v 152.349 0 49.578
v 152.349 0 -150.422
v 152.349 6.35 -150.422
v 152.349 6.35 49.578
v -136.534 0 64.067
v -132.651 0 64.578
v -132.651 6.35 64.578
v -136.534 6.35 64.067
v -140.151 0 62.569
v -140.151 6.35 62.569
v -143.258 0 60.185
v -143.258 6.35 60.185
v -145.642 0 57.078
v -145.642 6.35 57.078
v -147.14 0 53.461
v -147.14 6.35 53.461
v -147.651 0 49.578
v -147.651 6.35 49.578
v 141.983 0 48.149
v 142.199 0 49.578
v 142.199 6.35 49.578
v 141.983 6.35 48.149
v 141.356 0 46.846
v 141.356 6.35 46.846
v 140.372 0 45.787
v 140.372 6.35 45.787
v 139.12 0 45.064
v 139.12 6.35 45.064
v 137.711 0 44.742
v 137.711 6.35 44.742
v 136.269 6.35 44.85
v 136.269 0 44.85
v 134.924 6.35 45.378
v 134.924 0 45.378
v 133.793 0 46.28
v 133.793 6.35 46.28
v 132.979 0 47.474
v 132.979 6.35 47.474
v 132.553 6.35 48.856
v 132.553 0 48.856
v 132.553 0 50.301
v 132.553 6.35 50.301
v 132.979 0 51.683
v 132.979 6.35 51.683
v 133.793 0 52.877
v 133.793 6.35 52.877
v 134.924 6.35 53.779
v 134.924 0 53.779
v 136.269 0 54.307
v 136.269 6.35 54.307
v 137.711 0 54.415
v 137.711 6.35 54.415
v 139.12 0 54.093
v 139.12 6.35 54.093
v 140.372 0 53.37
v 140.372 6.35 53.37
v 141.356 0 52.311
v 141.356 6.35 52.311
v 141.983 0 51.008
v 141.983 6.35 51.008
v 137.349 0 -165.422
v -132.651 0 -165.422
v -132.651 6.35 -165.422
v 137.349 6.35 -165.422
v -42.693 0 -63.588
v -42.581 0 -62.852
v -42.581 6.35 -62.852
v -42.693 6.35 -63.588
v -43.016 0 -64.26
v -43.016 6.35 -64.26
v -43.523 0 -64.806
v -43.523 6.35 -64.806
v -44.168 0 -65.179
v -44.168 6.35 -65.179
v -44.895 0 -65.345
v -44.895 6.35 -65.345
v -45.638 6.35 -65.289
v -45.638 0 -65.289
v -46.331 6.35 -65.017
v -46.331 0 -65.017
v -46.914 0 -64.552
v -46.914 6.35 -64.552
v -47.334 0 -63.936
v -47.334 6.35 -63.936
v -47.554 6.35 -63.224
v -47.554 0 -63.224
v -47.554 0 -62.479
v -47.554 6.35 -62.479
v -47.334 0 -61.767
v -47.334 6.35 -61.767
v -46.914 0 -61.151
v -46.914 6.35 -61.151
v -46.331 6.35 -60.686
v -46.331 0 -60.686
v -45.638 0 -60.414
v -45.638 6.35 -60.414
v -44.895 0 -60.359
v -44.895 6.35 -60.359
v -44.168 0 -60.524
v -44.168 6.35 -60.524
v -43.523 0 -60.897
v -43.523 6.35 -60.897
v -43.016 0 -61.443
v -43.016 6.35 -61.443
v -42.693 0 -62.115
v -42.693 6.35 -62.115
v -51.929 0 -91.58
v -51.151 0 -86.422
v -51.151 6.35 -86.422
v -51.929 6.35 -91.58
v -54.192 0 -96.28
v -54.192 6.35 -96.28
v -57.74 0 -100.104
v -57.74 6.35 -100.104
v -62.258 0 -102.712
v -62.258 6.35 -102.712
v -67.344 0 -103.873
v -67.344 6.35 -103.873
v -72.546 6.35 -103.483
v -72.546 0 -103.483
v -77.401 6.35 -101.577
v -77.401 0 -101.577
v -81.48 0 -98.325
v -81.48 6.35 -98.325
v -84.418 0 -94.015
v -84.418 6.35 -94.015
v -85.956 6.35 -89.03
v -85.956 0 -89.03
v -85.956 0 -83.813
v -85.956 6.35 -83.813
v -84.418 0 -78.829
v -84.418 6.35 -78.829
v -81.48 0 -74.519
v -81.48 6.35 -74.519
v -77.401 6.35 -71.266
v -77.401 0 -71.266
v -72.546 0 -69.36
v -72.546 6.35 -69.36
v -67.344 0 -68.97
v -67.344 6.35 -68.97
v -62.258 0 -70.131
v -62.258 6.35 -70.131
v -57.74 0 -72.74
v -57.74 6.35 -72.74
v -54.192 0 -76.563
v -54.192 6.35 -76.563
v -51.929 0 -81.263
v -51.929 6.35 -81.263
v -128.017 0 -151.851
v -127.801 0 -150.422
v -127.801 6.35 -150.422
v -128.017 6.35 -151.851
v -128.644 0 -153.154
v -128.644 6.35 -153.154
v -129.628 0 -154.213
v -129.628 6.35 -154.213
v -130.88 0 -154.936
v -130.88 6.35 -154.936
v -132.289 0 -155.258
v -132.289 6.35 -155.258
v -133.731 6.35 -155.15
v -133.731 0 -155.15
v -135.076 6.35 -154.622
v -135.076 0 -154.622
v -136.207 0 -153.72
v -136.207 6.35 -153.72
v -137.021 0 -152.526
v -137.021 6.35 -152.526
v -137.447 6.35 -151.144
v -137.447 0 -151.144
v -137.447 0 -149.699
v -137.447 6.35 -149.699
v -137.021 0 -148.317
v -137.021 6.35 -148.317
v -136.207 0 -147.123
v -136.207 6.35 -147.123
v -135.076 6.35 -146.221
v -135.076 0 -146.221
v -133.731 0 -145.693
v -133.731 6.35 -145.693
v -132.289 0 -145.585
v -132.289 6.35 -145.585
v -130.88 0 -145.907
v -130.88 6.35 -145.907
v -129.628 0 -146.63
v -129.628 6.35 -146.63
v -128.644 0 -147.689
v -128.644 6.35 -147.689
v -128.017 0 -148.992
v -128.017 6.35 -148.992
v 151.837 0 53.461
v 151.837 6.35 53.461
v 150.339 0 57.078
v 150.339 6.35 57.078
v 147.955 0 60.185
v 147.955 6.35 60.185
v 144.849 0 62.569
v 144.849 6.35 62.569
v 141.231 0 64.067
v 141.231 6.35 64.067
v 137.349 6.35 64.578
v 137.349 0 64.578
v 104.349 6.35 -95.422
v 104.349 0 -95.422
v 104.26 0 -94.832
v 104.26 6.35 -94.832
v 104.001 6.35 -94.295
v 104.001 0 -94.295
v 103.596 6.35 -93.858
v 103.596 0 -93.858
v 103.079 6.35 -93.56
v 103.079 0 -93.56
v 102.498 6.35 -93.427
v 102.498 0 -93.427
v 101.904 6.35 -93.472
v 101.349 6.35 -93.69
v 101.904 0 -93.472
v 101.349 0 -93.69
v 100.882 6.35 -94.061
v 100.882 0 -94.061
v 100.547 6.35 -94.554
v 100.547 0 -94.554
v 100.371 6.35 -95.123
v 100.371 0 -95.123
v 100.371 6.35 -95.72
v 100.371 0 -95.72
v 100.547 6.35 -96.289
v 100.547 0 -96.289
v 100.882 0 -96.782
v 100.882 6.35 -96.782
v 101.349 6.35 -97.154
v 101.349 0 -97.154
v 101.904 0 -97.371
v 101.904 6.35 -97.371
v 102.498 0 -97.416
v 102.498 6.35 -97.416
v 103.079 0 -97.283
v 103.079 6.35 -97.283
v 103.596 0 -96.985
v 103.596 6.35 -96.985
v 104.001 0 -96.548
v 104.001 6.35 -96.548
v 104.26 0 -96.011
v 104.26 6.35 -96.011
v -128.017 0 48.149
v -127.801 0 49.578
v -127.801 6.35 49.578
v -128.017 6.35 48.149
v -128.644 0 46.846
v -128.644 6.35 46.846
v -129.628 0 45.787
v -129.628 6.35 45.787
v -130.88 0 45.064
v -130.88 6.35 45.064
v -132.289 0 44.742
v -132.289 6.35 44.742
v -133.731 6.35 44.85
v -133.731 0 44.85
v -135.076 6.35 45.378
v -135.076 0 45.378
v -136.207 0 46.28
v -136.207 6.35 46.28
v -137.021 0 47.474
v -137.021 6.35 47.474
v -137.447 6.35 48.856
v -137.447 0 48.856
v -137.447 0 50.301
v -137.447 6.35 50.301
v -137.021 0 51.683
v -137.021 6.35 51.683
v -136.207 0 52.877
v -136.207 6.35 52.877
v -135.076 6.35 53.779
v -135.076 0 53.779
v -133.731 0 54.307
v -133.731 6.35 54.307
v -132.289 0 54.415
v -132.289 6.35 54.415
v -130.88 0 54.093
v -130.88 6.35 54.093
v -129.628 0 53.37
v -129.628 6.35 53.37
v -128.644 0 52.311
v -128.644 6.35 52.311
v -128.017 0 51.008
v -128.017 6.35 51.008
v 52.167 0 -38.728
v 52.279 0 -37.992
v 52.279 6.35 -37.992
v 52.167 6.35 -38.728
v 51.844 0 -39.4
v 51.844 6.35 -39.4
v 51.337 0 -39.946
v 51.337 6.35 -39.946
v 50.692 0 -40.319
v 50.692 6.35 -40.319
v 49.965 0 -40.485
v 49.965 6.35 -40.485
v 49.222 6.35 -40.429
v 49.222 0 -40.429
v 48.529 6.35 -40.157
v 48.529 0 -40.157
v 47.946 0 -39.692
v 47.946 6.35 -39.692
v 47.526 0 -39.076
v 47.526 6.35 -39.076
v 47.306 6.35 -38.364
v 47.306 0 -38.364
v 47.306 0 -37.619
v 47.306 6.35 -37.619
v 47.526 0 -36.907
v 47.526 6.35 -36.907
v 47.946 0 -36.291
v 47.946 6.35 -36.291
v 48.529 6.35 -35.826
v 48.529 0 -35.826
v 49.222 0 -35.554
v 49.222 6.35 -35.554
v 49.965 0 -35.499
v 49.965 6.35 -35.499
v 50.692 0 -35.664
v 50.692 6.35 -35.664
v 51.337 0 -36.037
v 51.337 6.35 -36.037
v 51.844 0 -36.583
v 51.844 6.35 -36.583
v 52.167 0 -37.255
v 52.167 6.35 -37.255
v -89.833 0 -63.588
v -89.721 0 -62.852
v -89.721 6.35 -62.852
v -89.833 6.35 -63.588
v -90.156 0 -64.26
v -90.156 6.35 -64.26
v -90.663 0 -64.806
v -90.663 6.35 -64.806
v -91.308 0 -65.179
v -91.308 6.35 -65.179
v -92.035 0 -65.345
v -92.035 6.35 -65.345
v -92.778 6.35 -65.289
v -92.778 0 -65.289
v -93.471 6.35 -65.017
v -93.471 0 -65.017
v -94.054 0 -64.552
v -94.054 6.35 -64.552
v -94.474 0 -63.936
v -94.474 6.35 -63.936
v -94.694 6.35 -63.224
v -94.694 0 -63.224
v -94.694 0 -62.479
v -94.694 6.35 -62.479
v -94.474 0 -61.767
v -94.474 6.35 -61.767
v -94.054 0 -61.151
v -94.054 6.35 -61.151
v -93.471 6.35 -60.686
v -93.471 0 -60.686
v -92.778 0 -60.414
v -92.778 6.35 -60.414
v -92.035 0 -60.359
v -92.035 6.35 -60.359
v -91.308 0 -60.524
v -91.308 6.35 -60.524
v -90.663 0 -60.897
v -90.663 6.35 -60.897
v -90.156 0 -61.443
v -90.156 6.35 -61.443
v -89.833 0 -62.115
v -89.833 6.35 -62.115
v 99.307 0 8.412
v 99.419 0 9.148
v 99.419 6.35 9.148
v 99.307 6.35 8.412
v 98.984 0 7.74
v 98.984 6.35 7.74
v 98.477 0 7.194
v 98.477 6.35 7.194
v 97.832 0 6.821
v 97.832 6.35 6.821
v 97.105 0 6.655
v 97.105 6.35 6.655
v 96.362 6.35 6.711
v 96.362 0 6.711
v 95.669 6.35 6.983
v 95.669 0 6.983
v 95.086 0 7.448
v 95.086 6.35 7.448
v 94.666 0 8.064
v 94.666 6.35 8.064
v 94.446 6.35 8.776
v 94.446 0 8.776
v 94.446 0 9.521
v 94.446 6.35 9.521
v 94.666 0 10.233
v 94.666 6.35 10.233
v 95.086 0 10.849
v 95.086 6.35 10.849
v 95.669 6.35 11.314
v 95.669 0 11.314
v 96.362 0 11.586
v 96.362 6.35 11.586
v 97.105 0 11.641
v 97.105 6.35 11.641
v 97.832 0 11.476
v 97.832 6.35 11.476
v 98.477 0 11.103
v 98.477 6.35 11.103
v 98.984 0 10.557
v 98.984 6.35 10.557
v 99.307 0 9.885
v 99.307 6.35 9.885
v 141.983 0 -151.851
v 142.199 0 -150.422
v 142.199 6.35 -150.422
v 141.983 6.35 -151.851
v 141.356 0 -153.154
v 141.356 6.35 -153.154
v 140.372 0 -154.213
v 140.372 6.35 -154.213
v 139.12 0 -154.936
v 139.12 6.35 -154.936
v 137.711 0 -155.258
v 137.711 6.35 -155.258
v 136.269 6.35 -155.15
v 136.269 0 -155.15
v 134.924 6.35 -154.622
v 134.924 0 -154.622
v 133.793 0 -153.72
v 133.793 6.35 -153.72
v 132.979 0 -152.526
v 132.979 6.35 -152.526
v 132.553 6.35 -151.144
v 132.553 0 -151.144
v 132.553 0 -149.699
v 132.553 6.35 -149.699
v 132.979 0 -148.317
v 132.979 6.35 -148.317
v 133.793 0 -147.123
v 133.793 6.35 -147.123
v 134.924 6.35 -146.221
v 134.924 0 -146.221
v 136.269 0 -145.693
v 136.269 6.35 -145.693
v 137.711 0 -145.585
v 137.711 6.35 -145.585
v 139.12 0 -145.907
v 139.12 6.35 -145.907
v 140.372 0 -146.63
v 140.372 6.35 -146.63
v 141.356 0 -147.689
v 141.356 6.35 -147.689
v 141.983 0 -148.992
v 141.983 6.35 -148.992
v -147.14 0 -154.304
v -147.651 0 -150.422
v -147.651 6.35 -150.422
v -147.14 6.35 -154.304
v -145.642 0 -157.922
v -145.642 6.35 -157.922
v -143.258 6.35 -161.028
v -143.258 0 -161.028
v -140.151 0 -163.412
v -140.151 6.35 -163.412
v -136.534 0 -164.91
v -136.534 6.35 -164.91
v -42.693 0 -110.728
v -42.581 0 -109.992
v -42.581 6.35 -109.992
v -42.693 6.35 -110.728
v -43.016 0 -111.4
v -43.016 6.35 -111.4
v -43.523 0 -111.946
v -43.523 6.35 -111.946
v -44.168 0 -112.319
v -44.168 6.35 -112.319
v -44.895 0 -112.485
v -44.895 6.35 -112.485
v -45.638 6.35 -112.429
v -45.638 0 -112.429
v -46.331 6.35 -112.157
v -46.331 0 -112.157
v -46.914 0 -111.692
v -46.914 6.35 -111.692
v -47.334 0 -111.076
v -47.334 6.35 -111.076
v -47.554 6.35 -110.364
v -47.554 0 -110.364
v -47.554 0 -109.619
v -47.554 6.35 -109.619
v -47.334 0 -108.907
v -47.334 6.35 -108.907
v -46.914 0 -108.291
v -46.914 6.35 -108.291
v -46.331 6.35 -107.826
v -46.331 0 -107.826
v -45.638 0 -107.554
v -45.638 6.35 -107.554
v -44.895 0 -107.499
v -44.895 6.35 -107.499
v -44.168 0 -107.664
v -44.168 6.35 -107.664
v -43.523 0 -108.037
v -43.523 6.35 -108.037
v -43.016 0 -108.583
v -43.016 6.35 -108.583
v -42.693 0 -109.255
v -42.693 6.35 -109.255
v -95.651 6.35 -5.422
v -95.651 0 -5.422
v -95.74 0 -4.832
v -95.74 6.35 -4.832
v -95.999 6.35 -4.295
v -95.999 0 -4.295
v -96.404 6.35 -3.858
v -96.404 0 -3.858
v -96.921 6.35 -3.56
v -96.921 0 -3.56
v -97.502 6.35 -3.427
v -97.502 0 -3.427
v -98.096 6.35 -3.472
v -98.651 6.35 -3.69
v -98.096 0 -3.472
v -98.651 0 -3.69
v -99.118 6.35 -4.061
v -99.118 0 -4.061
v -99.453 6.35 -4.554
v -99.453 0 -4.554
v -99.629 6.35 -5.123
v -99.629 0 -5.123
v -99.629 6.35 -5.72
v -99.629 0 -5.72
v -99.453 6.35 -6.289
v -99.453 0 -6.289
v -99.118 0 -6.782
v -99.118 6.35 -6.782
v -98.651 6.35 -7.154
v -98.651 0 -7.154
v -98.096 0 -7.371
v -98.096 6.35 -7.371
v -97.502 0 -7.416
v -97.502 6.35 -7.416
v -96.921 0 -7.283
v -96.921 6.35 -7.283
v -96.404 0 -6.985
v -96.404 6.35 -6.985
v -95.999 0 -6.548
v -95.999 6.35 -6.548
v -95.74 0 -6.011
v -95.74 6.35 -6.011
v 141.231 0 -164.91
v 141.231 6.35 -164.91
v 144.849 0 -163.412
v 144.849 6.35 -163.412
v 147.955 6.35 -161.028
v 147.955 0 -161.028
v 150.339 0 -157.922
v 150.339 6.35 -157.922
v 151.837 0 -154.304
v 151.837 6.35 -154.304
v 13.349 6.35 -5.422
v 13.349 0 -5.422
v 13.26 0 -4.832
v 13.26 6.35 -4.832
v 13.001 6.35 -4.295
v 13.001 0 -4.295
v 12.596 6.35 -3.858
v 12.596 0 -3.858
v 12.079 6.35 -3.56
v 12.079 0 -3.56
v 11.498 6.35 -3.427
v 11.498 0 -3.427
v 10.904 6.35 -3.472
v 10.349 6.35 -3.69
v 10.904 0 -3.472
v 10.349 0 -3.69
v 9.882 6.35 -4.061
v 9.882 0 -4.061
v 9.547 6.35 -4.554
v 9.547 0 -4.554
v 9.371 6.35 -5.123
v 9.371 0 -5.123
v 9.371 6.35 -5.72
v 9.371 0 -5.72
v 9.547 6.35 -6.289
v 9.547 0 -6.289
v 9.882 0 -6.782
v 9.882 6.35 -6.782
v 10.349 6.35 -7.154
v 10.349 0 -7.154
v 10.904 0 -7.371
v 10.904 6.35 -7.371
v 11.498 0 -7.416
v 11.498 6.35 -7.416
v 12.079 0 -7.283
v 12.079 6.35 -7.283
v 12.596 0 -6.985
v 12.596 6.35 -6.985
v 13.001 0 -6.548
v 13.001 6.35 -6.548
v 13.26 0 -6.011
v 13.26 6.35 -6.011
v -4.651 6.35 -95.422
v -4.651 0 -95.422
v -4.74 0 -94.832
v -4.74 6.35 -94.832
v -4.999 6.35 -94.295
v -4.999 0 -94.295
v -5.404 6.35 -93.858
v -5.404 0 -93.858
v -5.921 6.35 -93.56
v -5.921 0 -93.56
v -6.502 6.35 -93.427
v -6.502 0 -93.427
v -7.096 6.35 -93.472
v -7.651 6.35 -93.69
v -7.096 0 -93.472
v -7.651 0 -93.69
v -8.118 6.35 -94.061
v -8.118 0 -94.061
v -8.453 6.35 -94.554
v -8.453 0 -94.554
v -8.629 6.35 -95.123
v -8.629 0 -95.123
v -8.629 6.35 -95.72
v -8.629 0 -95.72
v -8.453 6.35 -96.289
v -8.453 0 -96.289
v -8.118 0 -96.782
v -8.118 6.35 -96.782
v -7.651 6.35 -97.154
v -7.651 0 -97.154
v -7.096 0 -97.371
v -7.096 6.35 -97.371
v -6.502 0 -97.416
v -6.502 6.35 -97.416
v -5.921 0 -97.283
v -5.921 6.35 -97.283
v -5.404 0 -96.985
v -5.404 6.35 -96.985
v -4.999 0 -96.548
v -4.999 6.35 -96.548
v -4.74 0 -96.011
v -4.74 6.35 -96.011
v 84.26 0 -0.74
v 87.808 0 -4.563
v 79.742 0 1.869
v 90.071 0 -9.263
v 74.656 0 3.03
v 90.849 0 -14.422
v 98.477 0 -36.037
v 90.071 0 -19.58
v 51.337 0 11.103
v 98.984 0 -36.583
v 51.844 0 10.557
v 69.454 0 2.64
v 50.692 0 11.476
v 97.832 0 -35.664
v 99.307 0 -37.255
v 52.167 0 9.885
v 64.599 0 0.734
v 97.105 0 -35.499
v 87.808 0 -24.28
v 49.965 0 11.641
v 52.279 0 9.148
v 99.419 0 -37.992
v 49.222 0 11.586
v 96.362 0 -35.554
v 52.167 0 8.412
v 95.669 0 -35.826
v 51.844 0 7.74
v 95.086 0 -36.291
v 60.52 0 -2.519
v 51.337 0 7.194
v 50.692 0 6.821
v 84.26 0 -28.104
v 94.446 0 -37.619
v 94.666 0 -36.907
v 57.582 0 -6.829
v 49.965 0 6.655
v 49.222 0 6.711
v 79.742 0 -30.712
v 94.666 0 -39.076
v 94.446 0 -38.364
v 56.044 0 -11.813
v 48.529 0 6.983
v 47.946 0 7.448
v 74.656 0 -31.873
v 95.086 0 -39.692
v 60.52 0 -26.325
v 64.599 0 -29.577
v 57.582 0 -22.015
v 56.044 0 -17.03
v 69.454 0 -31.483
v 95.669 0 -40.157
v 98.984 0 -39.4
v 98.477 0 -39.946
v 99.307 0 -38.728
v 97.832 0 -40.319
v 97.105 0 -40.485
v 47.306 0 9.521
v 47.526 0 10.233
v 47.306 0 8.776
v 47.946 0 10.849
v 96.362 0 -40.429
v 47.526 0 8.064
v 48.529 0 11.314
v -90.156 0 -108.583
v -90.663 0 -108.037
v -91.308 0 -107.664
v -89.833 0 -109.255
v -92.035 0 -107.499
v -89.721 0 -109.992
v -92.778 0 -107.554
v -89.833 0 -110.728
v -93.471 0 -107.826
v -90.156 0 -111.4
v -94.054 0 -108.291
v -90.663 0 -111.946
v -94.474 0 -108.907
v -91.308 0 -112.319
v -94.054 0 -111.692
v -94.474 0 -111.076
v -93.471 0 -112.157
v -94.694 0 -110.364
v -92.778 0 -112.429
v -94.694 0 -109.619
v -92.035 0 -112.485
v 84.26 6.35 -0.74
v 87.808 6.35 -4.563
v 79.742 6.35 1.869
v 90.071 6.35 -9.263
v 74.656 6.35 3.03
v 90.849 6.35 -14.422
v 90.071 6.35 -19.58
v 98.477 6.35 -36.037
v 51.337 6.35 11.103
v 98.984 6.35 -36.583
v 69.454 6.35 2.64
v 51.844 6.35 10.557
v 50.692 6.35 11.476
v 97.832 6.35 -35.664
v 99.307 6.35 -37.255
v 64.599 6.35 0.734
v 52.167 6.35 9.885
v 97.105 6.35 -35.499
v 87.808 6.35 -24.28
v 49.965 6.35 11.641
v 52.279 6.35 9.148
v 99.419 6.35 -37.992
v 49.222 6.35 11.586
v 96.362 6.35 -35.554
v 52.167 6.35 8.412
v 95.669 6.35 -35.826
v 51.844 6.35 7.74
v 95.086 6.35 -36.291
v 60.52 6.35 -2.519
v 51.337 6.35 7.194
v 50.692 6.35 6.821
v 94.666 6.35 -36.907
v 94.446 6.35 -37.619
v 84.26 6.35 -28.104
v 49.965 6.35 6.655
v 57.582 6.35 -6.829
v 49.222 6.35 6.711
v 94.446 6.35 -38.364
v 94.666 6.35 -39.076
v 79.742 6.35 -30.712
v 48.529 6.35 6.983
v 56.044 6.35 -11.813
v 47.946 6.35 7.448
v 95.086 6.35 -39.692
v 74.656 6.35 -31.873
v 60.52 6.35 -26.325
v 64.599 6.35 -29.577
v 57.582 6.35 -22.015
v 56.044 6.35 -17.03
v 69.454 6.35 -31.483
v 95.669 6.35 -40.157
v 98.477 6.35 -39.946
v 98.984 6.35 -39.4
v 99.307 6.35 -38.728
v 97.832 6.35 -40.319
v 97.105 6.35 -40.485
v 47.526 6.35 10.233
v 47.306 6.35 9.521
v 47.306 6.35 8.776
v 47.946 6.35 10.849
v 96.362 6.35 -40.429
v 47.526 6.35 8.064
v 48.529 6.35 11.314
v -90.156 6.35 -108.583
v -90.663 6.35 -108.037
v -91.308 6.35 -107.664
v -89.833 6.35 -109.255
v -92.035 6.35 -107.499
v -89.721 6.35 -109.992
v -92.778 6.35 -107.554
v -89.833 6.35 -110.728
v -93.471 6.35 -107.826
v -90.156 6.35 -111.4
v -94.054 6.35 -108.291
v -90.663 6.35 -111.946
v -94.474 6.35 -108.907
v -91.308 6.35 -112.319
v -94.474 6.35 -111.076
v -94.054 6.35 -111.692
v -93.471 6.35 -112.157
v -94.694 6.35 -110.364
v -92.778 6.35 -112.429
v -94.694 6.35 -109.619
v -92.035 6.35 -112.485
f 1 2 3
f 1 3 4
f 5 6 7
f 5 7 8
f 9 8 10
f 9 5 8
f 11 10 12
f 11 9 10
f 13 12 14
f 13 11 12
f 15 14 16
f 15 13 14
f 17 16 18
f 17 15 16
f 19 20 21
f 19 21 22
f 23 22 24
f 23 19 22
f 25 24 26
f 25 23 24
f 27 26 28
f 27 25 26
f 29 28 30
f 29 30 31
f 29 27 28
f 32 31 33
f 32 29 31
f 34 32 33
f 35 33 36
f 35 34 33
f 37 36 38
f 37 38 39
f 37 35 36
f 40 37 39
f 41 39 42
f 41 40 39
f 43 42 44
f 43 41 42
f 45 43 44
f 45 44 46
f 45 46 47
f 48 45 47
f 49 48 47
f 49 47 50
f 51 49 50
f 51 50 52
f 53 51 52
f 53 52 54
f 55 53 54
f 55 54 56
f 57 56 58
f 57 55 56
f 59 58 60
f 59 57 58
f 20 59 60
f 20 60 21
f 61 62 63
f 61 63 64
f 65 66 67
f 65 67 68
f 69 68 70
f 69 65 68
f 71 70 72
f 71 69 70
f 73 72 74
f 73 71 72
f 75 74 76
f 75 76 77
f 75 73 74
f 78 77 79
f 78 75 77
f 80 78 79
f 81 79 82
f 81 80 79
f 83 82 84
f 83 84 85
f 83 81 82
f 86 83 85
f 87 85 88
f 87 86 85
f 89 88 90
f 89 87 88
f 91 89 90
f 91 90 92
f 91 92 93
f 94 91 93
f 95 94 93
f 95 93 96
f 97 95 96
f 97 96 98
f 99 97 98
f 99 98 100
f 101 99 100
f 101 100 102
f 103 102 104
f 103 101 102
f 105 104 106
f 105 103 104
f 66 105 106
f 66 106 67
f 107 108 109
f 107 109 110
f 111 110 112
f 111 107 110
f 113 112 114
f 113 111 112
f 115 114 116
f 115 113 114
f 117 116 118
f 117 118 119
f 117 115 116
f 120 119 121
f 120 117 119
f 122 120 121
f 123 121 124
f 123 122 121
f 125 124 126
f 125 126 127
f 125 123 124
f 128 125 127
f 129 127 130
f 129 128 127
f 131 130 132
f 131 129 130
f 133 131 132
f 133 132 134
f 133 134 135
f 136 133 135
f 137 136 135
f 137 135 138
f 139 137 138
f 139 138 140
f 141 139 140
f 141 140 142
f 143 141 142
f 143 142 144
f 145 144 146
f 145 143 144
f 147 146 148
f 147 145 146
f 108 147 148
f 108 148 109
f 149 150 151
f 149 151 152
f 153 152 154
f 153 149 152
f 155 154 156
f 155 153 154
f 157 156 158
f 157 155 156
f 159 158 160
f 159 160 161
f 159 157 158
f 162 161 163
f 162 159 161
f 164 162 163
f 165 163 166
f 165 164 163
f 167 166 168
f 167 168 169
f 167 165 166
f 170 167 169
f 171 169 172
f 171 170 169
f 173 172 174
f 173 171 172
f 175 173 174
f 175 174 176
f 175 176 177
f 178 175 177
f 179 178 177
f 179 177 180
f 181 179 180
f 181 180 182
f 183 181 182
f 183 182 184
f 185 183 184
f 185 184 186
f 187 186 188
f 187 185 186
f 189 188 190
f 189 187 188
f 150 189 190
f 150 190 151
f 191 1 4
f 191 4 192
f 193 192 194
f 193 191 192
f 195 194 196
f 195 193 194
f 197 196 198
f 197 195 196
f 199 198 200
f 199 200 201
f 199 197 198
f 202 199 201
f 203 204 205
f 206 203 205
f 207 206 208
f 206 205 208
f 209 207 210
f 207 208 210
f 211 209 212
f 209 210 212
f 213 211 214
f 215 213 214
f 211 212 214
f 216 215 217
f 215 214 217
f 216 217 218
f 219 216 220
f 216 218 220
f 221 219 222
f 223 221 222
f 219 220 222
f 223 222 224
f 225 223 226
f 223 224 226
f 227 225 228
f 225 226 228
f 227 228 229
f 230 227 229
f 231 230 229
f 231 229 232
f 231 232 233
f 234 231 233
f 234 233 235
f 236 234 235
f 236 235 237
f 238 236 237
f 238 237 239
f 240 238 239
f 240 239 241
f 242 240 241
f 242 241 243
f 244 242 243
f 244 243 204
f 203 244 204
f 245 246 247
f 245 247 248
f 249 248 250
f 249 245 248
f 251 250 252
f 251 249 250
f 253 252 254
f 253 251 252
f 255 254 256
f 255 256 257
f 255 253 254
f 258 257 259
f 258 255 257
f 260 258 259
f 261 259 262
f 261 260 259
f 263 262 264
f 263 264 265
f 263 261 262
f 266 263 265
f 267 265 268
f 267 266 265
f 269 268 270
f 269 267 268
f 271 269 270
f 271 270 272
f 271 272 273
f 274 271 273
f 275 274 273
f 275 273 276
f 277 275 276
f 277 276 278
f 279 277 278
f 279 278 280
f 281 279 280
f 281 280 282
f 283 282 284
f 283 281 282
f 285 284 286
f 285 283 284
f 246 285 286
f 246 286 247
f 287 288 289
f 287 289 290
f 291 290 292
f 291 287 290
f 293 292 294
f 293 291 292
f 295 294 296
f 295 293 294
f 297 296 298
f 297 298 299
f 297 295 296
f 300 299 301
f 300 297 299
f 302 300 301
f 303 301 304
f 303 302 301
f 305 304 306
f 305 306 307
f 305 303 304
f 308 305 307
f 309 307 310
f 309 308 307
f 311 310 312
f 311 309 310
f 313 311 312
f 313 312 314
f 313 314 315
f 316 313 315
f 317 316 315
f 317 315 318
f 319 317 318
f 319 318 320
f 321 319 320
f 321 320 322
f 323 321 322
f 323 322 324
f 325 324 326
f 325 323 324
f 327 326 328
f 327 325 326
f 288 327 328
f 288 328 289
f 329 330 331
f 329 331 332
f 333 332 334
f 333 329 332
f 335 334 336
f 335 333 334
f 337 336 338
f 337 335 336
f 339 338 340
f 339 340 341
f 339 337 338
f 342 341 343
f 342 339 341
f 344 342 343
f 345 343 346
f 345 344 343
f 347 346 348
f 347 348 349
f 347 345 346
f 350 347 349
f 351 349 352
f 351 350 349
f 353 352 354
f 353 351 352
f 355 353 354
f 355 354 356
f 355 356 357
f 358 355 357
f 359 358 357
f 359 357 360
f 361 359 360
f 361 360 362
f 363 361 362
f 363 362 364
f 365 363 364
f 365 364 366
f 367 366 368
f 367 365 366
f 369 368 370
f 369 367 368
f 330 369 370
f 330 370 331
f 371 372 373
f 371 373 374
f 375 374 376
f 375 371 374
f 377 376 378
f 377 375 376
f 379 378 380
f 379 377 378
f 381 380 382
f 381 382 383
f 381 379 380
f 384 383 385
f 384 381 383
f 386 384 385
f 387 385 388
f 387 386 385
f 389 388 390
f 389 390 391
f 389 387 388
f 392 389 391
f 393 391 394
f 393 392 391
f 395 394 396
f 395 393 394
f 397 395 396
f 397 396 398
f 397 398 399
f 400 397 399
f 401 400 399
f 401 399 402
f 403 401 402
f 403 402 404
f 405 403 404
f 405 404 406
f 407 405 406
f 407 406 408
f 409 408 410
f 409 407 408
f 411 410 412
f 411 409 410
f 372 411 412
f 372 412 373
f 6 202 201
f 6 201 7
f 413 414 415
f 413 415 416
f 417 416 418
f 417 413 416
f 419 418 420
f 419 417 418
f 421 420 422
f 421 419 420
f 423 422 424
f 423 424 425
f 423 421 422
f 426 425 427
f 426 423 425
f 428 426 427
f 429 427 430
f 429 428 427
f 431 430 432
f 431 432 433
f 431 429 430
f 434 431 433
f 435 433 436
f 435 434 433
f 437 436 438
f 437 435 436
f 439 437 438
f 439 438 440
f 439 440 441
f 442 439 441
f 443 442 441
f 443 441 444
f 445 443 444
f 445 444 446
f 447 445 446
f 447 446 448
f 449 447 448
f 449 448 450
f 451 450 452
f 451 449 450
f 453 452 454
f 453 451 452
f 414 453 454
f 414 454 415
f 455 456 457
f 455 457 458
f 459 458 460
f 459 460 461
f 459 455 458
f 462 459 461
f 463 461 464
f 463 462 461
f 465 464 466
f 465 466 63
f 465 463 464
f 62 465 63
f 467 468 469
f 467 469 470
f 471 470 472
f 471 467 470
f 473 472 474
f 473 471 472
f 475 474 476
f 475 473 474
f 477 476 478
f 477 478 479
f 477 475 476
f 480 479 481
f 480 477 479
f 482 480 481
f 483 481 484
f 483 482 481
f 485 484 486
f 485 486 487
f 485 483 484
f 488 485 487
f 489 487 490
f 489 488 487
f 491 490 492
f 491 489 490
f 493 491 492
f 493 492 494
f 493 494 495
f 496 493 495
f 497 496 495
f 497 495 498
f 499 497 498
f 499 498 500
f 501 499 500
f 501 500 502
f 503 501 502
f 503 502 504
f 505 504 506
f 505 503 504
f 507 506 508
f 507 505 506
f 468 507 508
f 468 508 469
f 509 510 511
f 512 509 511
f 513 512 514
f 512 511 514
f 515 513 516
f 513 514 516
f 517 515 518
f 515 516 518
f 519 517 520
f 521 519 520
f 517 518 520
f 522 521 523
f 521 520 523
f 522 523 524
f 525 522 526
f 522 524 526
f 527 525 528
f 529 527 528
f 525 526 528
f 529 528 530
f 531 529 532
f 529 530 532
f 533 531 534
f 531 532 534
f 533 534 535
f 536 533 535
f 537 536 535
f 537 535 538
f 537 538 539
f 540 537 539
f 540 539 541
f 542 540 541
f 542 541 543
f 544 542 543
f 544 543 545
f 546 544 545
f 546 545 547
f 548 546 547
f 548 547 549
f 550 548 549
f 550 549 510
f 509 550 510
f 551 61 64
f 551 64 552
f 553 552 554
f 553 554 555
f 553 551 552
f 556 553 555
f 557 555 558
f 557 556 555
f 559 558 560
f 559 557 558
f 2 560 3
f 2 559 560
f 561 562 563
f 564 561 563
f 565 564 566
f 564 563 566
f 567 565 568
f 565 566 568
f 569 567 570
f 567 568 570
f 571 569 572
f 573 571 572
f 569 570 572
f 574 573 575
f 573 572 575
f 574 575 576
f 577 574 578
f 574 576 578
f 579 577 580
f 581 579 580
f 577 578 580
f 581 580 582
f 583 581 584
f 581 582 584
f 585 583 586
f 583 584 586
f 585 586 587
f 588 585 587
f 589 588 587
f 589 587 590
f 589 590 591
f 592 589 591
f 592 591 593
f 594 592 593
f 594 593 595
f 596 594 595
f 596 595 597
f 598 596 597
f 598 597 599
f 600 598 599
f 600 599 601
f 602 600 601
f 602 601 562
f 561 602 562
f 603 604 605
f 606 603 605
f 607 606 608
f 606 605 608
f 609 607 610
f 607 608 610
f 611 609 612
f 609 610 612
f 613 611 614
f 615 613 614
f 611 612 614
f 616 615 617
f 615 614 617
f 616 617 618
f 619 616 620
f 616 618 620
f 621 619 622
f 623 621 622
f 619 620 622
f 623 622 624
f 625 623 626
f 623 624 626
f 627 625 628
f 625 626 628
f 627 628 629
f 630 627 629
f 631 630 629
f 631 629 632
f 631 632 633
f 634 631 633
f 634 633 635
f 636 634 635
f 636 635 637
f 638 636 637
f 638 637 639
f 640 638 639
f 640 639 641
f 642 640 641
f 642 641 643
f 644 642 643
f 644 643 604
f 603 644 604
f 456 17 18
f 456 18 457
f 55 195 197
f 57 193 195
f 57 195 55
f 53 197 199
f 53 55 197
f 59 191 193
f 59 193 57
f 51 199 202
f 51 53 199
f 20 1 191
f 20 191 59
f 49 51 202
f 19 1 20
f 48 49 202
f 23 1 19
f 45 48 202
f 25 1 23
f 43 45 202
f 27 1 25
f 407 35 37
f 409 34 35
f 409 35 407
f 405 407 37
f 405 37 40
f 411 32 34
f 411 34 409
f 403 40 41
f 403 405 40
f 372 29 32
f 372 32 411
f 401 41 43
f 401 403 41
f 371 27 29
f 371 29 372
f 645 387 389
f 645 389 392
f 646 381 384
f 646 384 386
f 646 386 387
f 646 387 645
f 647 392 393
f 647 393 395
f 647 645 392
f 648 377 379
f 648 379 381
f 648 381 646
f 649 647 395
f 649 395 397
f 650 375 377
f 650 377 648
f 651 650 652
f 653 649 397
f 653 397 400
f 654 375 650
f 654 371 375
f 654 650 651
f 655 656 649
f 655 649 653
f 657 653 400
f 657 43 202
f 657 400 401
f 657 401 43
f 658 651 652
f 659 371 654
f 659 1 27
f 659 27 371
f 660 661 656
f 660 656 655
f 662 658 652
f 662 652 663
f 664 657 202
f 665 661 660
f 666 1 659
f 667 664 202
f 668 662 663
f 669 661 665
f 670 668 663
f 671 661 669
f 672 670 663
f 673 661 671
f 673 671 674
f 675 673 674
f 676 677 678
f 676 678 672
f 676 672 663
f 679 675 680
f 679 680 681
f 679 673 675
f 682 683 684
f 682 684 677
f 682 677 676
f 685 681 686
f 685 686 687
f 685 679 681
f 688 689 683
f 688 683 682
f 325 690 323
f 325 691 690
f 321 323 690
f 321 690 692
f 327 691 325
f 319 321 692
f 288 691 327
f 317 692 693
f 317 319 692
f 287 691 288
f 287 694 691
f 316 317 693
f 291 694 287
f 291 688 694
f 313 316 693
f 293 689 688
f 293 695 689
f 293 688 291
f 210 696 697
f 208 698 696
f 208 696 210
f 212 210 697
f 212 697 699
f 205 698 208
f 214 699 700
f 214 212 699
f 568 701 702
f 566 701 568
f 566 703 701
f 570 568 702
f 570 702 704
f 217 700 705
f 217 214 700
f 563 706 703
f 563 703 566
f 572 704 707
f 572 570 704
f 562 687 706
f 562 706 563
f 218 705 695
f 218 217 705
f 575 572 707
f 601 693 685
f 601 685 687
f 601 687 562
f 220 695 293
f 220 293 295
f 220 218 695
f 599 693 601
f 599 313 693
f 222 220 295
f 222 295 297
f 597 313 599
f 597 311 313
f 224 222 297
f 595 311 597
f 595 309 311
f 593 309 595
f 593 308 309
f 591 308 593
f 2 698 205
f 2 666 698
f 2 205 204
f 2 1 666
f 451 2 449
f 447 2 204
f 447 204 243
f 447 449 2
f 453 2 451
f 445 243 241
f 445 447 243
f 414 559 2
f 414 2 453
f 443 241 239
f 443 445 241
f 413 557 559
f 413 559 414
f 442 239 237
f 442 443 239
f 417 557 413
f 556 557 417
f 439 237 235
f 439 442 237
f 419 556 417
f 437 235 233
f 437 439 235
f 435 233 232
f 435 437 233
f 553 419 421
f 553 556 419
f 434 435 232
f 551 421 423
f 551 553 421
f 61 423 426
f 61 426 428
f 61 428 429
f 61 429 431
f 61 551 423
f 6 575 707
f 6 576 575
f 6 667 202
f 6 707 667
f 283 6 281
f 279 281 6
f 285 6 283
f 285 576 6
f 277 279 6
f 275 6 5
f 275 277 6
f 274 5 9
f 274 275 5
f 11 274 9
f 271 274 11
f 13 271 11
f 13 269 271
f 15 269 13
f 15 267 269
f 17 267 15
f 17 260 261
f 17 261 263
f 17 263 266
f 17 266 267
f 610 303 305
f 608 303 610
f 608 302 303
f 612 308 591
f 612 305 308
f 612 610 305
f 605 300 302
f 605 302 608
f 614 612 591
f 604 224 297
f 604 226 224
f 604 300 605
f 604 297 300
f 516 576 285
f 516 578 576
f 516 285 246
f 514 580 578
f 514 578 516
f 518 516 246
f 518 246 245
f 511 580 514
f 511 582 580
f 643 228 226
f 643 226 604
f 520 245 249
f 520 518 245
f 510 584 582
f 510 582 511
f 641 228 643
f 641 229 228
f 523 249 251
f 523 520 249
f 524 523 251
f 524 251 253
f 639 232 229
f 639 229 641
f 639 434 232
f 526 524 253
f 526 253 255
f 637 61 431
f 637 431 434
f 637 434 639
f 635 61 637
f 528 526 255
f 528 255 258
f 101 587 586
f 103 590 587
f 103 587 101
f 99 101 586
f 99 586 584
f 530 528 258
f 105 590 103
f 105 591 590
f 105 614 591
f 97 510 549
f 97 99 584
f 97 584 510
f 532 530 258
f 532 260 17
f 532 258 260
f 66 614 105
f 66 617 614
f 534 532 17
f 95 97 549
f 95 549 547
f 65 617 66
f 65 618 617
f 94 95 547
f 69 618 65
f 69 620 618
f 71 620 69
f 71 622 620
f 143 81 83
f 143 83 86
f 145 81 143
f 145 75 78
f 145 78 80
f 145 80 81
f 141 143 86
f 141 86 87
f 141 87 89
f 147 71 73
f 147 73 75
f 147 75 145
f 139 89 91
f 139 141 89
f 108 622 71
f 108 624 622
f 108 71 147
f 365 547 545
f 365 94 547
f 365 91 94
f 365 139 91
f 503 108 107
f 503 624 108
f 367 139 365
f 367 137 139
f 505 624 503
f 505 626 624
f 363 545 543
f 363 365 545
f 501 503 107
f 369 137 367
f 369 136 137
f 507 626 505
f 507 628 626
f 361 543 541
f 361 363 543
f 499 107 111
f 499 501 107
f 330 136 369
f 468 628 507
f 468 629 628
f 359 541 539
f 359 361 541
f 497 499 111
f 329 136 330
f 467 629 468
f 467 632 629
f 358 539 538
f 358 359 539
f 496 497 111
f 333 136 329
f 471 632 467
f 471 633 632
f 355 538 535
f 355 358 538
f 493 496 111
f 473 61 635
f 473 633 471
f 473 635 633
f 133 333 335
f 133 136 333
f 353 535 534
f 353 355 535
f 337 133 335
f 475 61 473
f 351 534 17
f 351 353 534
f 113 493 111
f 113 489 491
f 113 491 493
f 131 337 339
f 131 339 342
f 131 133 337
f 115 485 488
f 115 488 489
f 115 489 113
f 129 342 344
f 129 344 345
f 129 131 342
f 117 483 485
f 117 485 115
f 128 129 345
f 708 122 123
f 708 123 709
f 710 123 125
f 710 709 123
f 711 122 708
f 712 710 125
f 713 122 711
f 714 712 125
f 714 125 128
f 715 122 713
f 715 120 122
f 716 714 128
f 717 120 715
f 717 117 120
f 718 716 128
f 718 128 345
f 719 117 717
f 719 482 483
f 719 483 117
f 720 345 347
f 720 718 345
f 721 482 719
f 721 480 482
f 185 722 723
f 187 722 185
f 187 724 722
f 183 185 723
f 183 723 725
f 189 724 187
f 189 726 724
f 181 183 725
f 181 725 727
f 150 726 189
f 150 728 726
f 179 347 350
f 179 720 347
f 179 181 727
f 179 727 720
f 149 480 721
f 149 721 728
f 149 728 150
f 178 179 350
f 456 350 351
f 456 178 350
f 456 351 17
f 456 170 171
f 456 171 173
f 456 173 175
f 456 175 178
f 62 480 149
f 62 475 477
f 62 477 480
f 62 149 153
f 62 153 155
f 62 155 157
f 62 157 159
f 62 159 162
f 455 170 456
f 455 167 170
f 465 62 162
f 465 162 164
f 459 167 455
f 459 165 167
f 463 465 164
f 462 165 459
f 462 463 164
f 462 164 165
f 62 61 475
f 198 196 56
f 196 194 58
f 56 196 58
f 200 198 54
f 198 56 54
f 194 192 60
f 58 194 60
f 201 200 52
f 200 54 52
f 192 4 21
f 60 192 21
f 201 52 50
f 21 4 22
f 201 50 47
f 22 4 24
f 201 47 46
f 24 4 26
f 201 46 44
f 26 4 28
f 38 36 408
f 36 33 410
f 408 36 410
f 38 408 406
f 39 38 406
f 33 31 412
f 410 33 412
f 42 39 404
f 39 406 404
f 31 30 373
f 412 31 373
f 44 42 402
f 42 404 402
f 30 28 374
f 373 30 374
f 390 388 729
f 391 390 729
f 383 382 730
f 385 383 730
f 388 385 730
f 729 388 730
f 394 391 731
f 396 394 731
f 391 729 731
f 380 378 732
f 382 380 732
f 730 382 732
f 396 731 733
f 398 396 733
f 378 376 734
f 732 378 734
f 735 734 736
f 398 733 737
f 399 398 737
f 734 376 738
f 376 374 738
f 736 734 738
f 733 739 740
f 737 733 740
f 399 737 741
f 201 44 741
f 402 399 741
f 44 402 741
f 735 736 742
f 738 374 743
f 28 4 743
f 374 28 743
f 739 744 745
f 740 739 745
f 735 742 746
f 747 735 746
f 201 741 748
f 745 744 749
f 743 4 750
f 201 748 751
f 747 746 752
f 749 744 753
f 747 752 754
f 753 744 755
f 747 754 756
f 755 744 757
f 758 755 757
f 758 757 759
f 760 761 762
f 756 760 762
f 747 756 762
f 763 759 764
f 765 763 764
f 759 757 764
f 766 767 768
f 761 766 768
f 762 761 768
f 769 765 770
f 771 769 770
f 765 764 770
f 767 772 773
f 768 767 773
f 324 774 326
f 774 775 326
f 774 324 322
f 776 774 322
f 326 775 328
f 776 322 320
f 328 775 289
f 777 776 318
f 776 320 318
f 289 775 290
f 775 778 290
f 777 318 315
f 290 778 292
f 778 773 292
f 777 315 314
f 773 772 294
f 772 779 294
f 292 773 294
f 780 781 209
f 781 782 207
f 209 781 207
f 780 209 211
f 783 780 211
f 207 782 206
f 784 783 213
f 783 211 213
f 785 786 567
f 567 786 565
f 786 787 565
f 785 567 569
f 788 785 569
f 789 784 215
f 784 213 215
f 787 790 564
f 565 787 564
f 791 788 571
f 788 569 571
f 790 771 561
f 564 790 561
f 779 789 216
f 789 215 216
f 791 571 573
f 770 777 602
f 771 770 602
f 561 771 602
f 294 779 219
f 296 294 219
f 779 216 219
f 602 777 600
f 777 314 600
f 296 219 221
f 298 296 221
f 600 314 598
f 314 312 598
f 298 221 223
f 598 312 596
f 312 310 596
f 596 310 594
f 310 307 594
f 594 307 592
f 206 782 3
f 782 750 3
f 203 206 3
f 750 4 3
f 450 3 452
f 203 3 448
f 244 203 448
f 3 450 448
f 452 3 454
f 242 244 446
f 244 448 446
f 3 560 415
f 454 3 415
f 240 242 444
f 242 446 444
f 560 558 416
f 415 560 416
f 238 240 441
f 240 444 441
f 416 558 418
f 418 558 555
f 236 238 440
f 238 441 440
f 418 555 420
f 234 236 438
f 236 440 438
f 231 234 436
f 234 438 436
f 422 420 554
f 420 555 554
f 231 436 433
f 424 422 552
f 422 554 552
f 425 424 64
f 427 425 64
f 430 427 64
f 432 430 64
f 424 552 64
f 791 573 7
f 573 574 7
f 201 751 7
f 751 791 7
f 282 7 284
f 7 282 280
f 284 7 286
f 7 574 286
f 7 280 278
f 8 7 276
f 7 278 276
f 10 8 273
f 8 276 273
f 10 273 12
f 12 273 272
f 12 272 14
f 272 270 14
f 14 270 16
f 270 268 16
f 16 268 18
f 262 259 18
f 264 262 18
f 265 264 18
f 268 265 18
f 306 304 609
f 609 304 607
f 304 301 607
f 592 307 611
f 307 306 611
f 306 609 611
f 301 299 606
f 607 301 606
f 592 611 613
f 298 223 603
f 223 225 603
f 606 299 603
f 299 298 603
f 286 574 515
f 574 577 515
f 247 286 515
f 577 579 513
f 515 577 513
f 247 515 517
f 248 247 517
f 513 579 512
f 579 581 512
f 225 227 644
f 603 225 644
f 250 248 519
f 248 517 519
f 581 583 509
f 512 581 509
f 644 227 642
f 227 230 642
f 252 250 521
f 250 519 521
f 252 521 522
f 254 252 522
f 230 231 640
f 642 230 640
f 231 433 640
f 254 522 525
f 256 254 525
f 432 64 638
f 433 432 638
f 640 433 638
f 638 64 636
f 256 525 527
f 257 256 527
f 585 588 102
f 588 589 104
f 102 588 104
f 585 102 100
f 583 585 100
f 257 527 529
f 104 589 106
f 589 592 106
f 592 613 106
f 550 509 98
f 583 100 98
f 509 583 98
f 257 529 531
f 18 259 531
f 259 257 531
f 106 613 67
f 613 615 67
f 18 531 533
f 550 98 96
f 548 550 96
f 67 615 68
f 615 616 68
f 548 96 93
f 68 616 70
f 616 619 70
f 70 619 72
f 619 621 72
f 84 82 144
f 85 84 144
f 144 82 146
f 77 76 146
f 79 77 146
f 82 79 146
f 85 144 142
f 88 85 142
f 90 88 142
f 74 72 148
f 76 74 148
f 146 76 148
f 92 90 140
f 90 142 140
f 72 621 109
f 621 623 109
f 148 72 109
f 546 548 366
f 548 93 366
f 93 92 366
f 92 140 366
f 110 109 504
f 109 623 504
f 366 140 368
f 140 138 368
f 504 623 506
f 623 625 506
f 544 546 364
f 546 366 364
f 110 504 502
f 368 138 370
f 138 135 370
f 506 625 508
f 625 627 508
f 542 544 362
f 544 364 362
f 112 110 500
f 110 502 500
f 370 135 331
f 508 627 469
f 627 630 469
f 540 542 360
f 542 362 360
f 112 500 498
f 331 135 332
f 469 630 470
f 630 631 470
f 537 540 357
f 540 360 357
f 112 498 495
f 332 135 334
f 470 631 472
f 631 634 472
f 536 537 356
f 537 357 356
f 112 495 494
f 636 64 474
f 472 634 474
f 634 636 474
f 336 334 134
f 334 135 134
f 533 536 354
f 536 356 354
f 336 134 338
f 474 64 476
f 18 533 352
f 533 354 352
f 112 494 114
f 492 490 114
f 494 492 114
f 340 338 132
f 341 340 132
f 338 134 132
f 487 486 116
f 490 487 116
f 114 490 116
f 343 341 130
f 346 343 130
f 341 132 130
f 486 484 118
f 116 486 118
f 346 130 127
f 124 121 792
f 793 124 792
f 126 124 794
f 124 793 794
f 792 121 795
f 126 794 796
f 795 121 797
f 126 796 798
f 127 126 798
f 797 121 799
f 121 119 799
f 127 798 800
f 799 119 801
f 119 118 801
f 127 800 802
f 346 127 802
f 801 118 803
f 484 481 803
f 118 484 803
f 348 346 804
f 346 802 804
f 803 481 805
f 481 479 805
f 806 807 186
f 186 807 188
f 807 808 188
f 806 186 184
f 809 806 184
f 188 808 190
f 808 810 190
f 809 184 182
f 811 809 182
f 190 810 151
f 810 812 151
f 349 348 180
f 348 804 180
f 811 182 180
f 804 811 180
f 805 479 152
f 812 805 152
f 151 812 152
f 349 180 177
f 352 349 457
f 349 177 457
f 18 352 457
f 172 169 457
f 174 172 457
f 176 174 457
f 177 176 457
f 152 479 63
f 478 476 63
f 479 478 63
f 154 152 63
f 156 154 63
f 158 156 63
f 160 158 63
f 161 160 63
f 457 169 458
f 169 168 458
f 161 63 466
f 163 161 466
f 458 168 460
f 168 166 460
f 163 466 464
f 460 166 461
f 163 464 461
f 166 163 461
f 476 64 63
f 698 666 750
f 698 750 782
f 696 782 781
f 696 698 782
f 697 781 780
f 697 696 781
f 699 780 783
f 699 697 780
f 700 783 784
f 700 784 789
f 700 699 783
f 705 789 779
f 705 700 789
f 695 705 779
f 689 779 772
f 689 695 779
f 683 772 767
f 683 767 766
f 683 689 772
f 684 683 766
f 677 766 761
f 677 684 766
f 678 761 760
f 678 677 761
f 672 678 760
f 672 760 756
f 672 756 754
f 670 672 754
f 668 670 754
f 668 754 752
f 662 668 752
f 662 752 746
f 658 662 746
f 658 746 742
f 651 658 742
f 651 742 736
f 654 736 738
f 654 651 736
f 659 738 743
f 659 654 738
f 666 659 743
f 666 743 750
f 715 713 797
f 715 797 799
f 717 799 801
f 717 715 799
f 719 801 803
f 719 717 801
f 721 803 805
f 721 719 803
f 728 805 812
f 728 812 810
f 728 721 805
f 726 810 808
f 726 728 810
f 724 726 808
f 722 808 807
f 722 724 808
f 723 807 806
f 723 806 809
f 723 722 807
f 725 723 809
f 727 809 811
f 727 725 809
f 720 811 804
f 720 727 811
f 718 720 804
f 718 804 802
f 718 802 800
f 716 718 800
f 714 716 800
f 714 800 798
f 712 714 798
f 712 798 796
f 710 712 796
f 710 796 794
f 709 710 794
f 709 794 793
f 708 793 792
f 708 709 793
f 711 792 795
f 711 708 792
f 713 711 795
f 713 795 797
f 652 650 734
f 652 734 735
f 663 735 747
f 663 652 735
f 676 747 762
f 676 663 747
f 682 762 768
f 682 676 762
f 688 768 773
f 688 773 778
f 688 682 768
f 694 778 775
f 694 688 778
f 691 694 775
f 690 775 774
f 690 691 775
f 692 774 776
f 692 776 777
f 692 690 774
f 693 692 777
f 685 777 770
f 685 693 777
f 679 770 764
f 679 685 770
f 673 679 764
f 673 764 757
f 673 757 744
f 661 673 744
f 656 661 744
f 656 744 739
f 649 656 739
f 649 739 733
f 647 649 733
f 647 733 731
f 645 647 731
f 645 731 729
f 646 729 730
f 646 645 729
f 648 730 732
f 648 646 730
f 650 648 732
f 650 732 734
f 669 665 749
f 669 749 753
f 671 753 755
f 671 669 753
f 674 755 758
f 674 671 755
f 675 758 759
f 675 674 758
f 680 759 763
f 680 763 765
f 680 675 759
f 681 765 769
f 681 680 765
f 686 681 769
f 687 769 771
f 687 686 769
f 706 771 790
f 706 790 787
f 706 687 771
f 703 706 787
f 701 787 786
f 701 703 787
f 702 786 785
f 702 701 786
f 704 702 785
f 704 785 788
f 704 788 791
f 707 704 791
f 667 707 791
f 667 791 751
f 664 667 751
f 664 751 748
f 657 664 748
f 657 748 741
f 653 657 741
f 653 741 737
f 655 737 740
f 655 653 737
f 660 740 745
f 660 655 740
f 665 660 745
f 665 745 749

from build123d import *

# Parameters (mm, degrees)
SKETCH1_R           = 4.85
SKETCH1_R_2         = 2.5
SKETCH1_R_3         = 17.5
BOSS_EXTRUDE1_DEPTH = 6.35
SKETCH5_R           = 2
CUT_EXTRUDE2_DEPTH  = 10


with BuildPart() as part:
    # Sketch1 → Boss-Extrude1 (new body)
    with BuildSketch(Plane(origin=(0, 0, 0), x_dir=(1, 0, 0), z_dir=(0, 1, 0))):
        with BuildLine():
            Line((-132.651439051, 165.421561199), (137.348560949, 165.421561199))
            ThreePointArc((137.348560949, 165.421561199), (147.955162667, 161.028162917), (152.348560949, 150.421561199))
            Line((152.348560949, 150.421561199), (152.348560949, -49.578438801))
            ThreePointArc((152.348560949, -49.578438801), (147.955162667, -60.185040519), (137.348560949, -64.578438801))
            Line((137.348560949, -64.578438801), (-132.651439051, -64.578438801))
            ThreePointArc((-132.651439051, -64.578438801), (-143.258040769, -60.185040519), (-147.651439051, -49.578438801))
            Line((-147.651439051, -49.578438801), (-147.651439051, 150.421561199))
            ThreePointArc((-147.651439051, 150.421561199), (-143.258040769, 161.028162917), (-132.651439051, 165.421561199))
        make_face()
        with Locations((-132.651439051, 150.421561199)):
            Circle(SKETCH1_R, mode=Mode.SUBTRACT)
        with Locations((137.348560949, -49.578438801)):
            Circle(SKETCH1_R, mode=Mode.SUBTRACT)
        with Locations((-45.081439051, 109.991561199)):
            Circle(SKETCH1_R_2, mode=Mode.SUBTRACT)
        with Locations((-45.081439051, 62.851561199)):
            Circle(SKETCH1_R_2, mode=Mode.SUBTRACT)
        with Locations((-92.221439051, 62.851561199)):
            Circle(SKETCH1_R_2, mode=Mode.SUBTRACT)
        with Locations((-92.221439051, 109.991561199)):
            Circle(SKETCH1_R_2, mode=Mode.SUBTRACT)
        with Locations((49.778560949, 37.991561199)):
            Circle(SKETCH1_R_2, mode=Mode.SUBTRACT)
        with Locations((96.918560949, 37.991561199)):
            Circle(SKETCH1_R_2, mode=Mode.SUBTRACT)
        with Locations((96.918560949, -9.148438801)):
            Circle(SKETCH1_R_2, mode=Mode.SUBTRACT)
        with Locations((49.778560949, -9.148438801)):
            Circle(SKETCH1_R_2, mode=Mode.SUBTRACT)
        with Locations((137.348560949, 150.421561199)):
            Circle(SKETCH1_R, mode=Mode.SUBTRACT)
        with Locations((-132.651439051, -49.578438801)):
            Circle(SKETCH1_R, mode=Mode.SUBTRACT)
        with Locations((-68.651439051, 86.421561199)):
            Circle(SKETCH1_R_3, mode=Mode.SUBTRACT)
        with Locations((73.348560949, 14.421561199)):
            Circle(SKETCH1_R_3, mode=Mode.SUBTRACT)
    extrude(amount=BOSS_EXTRUDE1_DEPTH)

    # Sketch5 → Cut-Extrude2 (cut)
    with BuildSketch(Plane.XZ):
        with Locations((-97.651439051, -5.421561199)):
            Circle(SKETCH5_R)
        with Locations((11.348560949, -5.421561199)):
            Circle(SKETCH5_R)
        with Locations((-6.651439051, -95.421561199)):
            Circle(SKETCH5_R)
        with Locations((102.348560949, -95.421561199)):
            Circle(SKETCH5_R)
    extrude(amount=-CUT_EXTRUDE2_DEPTH, mode=Mode.SUBTRACT)


solid = part.part
